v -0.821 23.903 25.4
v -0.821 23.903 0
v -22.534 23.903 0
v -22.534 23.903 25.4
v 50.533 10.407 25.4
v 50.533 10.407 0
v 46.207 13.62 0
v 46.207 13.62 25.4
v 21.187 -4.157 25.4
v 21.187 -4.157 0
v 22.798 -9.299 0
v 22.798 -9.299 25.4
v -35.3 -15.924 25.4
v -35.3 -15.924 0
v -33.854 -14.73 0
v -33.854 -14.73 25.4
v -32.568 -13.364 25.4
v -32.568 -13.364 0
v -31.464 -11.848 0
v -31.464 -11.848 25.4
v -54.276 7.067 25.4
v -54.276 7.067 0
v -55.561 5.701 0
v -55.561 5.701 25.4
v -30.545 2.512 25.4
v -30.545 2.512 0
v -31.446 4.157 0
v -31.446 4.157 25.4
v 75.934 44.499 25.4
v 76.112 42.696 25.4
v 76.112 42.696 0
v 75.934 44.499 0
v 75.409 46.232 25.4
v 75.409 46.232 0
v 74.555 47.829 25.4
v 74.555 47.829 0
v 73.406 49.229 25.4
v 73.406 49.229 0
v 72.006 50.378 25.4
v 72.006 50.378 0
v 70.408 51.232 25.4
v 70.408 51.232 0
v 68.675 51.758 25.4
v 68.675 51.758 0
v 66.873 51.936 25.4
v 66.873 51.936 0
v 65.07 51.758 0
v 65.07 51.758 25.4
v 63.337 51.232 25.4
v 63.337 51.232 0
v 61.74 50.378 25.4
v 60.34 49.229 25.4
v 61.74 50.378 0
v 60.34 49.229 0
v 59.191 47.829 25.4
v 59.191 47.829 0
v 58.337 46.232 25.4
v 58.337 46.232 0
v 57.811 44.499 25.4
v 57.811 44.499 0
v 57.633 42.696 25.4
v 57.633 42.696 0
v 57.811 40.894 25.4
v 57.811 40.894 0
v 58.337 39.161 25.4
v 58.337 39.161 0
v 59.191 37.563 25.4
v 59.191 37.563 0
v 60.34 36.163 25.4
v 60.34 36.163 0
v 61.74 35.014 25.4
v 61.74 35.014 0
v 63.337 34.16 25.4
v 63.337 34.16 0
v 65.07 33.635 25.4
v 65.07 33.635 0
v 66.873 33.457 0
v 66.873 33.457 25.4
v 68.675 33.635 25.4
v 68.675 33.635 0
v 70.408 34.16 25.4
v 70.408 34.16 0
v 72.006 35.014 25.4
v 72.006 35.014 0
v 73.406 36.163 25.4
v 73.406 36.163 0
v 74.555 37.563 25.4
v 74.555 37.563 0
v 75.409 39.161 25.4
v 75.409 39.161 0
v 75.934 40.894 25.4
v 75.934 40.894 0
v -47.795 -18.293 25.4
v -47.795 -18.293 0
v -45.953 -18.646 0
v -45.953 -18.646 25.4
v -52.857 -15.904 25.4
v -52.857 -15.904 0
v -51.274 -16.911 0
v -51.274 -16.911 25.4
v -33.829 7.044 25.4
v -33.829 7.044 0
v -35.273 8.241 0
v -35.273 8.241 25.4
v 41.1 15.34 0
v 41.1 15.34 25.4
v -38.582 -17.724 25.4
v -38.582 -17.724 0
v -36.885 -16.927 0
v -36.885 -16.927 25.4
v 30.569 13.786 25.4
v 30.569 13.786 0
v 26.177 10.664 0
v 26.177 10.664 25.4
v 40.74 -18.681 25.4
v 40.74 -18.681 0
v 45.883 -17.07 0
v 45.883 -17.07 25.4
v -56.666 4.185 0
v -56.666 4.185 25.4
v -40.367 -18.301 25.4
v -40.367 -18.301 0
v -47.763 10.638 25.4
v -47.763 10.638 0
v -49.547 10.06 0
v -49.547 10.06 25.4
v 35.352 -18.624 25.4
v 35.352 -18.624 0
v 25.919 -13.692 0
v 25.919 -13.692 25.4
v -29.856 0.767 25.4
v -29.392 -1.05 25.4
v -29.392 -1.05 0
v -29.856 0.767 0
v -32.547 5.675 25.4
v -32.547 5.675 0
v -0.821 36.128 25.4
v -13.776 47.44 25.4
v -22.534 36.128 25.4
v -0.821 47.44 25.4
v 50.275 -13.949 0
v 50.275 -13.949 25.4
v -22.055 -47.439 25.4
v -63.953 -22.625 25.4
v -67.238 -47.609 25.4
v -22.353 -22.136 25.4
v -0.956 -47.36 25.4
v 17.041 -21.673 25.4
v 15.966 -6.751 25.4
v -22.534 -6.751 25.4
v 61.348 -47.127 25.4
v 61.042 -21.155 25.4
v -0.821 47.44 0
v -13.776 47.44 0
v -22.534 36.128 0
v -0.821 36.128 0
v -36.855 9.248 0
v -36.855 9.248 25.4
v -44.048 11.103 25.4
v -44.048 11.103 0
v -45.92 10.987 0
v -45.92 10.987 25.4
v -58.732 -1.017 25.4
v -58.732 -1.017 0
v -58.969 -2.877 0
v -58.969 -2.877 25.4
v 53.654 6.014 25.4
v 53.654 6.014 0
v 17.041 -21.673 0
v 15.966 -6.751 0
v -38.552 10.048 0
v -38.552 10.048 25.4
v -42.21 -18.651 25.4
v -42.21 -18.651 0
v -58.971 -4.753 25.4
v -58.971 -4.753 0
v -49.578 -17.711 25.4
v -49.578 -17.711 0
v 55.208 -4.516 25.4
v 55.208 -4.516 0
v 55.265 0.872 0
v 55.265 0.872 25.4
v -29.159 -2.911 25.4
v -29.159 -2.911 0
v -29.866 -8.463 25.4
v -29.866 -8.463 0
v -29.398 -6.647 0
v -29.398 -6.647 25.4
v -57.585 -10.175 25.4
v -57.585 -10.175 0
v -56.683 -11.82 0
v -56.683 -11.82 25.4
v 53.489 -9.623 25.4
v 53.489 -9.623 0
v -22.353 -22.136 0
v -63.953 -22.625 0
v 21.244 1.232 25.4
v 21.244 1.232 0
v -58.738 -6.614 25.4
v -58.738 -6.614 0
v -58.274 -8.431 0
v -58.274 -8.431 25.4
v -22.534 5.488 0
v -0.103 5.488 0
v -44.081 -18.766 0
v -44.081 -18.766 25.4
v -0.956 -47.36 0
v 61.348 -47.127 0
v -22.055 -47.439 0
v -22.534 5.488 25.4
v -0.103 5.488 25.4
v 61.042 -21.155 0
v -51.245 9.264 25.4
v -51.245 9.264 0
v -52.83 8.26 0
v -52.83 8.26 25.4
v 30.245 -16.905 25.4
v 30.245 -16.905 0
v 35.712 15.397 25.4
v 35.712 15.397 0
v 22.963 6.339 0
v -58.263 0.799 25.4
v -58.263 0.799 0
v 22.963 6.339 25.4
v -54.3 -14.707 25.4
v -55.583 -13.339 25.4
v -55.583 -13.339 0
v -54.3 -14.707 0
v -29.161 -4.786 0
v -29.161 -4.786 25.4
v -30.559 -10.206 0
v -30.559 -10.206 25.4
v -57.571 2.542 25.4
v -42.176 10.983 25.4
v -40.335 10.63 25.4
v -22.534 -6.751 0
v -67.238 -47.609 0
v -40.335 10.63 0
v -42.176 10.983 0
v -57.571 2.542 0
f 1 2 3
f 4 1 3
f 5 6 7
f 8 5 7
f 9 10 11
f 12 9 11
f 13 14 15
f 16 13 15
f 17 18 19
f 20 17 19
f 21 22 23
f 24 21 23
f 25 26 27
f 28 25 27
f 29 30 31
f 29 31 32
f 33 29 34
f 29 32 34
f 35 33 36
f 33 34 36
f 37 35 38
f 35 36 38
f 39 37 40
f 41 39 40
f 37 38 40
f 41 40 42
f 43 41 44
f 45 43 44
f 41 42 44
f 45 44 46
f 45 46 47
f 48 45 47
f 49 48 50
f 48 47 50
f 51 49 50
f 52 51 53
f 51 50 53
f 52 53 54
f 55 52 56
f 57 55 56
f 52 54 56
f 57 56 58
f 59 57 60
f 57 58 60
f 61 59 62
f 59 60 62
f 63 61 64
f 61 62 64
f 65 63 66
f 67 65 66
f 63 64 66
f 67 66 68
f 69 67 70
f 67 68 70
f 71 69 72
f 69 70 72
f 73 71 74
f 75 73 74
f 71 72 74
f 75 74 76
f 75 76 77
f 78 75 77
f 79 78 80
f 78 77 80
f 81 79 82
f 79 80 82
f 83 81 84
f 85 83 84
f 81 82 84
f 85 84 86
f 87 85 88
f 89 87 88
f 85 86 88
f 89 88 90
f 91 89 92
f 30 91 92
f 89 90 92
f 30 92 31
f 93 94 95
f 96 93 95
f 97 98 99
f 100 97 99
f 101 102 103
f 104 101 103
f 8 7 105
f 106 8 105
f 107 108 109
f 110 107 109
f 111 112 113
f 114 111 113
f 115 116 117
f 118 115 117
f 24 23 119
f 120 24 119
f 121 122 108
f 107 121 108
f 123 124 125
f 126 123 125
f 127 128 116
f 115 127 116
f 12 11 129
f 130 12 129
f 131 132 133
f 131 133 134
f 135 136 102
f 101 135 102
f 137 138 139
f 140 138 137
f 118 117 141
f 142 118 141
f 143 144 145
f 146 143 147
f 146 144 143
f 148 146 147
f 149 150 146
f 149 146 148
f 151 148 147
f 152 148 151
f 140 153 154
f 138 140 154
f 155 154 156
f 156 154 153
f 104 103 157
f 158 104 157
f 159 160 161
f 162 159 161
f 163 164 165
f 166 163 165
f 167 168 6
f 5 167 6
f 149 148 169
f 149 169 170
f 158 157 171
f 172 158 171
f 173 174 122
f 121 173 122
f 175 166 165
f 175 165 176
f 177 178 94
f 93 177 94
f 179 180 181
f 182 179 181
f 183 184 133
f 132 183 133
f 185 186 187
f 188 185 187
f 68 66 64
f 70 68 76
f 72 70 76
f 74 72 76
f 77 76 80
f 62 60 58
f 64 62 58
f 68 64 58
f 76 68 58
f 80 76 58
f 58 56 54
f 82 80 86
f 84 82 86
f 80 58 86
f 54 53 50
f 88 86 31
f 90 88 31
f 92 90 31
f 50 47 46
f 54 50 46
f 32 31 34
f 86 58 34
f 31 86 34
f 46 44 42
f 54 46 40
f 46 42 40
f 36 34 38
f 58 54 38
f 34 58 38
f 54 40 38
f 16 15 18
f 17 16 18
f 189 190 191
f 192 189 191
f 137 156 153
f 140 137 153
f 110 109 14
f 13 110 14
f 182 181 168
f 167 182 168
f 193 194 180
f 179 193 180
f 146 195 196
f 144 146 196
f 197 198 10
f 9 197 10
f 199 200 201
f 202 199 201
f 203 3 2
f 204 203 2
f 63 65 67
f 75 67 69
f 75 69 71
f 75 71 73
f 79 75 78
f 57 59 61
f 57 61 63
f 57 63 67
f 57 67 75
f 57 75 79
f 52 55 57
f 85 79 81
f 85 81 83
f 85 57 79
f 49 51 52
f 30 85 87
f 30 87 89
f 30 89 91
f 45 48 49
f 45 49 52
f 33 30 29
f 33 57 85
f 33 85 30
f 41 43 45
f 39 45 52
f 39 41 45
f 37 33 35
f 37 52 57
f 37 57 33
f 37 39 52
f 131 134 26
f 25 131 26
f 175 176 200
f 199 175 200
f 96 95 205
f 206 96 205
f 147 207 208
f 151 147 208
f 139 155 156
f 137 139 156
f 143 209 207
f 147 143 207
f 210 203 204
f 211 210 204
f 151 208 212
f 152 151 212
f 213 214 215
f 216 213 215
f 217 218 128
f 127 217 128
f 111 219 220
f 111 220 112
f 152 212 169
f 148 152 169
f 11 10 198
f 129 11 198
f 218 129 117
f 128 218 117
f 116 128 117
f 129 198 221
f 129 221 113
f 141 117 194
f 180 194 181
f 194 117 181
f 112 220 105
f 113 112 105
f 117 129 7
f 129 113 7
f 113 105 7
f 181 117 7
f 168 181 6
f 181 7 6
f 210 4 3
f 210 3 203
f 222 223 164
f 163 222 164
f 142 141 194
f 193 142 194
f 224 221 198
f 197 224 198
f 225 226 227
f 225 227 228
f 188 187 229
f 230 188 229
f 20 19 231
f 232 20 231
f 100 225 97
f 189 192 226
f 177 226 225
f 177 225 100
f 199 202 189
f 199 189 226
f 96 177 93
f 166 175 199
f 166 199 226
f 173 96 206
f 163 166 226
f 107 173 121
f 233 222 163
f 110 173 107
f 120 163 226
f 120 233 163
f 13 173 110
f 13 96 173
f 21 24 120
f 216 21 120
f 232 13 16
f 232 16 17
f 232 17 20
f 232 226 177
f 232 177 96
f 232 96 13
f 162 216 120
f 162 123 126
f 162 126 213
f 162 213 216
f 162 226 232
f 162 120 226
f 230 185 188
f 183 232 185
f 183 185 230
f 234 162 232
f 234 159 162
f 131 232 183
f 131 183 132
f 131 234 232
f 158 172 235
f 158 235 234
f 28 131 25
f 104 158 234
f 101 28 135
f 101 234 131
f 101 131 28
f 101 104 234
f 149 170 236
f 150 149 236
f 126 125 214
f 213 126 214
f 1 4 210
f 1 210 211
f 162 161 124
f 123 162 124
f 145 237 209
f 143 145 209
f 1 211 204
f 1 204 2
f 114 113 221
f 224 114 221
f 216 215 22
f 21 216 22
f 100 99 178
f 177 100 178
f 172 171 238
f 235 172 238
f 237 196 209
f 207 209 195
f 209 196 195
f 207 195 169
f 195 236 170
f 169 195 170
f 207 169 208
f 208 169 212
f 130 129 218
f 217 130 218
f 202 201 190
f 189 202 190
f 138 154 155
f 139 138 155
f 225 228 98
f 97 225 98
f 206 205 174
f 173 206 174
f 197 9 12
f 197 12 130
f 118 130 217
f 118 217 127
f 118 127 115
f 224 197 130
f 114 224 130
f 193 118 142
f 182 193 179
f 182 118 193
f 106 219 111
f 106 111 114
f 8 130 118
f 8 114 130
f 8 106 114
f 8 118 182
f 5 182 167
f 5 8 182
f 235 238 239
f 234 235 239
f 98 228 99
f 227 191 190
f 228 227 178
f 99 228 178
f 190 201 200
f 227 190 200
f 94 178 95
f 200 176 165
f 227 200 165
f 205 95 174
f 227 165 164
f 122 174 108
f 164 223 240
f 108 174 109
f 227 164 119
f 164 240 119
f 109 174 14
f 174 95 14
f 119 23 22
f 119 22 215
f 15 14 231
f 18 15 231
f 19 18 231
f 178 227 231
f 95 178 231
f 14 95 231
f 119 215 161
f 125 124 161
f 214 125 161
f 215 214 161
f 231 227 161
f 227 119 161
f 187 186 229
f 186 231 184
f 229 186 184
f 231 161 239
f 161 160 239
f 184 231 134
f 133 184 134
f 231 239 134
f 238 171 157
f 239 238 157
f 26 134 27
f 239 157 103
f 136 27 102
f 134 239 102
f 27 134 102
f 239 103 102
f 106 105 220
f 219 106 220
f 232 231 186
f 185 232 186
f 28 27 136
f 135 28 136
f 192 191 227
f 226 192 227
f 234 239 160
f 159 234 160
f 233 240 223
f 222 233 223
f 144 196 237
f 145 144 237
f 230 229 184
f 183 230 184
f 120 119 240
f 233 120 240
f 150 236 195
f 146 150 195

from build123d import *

# Parameters (mm, degrees)
F1_DEPTH = 25.4
F3_R     = 9.2391890303
F4_DEPTH = 25.4
F6_DEPTH = 25.4


with BuildPart() as f1:
    # F0 (on Top) → F1 (new body)
    with BuildSketch(Plane.XY):
        Polygon((-35.2999434542, -15.9238262774), (-33.8535144259, -14.7299484609), (-32.5681234897, -13.3641991003), (-31.4640420286, -11.848116879), (-30.5586820668, -10.2056113191), (-29.8663216716, -8.4625857147), (-29.3978797801, -6.6465286206), (-29.1607440008, -4.7860803421), (-29.1586541066, -2.91058126), (-29.3916430563, -1.0496091151), (-29.8560364751, 0.7674874501), (-30.5445106012, 2.5120517373), (-31.4462077865, 4.1565709256), (-32.5469077277, 5.675109965), (-33.8292517292, 7.0437205876), (-35.2730164601, 8.2408189865), (-36.855432888, 9.2475262047), (-38.5515453607, 10.0479658681), (-40.3346051712, 10.6295145649), (-42.1764924012, 10.9830009248), (-44.0481593888, 11.1028502569), (-45.9200888274, 10.9871724654), (-47.7627592716, 10.6377918584), (-49.5471107078, 10.0602183766), (-51.2450028479, 9.2635606989), (-52.8296589185, 8.2603825928), (-54.2760879468, 7.0665047763), (-55.5614788829, 5.7007554158), (-56.665560344, 4.1846731944), (-57.5709203059, 2.5421676345), (-58.2632807011, 0.7991420301), (-58.7317225925, -1.016915064), (-58.9688583718, -2.8773633425), (-58.9709482661, -4.7528624246), (-58.7379593163, -6.6138345695), (-58.2735658976, -8.4309311347), (-57.5850917714, -10.1754954219), (-56.6833945861, -11.8200146102), (-55.5826946449, -13.3385536495), (-54.3003506434, -14.7071642722), (-52.8565859126, -15.9042626711), (-51.2741694846, -16.9109698893), (-49.5780570119, -17.7114095526), (-47.7949972014, -18.2929582495), (-45.9531099714, -18.6464446094), (-44.0814429839, -18.7662939415), (-42.2095135452, -18.65061615), (-40.366843101, -18.301235543), (-38.5824916648, -17.7236620612), (-36.8845995248, -16.9270043835), align=None)
    extrude(amount=F1_DEPTH)


with BuildPart() as f1b:
    # F0 (on Top) → F1, piece 2 (new body)
    with BuildSketch(Plane.XY):
        Polygon((45.8826378737, -17.0699117925), (50.2753301706, -13.9487886581), (53.4885487135, -9.6230075922), (55.2077612837, -4.516006185), (55.2646793763, 0.8723066832), (53.653731452, 6.0144854062), (50.5326083176, 10.407177703), (46.2068272516, 13.6203962459), (41.0998258444, 15.3396088161), (35.7115129763, 15.3965269088), (30.5693342532, 13.7855789844), (26.1766419564, 10.66445585), (22.9634234135, 6.3386747841), (21.2442108433, 1.2316733769), (21.1872927506, -4.1566394913), (22.798240675, -9.2988182143), (25.9193638094, -13.6915105111), (30.2451448753, -16.904729054), (35.3521462825, -18.6239416242), (40.7404591507, -18.6808597169), align=None)
    extrude(amount=F1_DEPTH)


with BuildPart() as f4:
    # F3 (on Top) → F4 (new body)
    with BuildSketch(Plane.XY):
        with Locations((66.8726712465, 42.6963306963)):
            Circle(F3_R)
    extrude(amount=F4_DEPTH)


with BuildPart() as f4b:
    # F2 (on Top) → F4, piece 2 (new body)
    with BuildSketch(Plane.XY):
        Polygon((-13.7759521604, 47.4403649569), (-22.534172982, 36.1276641488), (-0.8210833184, 36.1276641488), (-0.8210833184, 47.4403649569), align=None)
    extrude(amount=F4_DEPTH)


with BuildPart() as f4c:
    # F2 (on Top) → F4, piece 3 (new body)
    with BuildSketch(Plane.XY):
        Polygon((-0.8210833184, 23.9026453346), (-22.534172982, 23.9026453346), (-22.534172982, 5.4876731566), (-0.1027688056, 5.4876731566), align=None)
    extrude(amount=F4_DEPTH)


with BuildPart() as f6:
    # F5 (on Top) → F6 (new body)
    with BuildSketch(Plane.XY):
        Polygon((-22.0554731194, -47.4393907258), (-22.3531693042, -22.1359777789), (-63.9532580972, -22.6254053414), (-67.2375932336, -47.608587577), align=None)
        Polygon((17.0406657768, -21.6725069248), (-22.3531693042, -22.1359777789), (-22.0554731194, -47.4393907258), (-0.9564412048, -47.3603796091), (18.874789772, -47.1270639764), align=None)
        Polygon((15.9655082971, -6.751128938), (-22.534172982, -6.751128938), (-22.3531693042, -22.1359777789), (17.0406657768, -21.6725069248), align=None)
        Polygon((61.0423149158, -21.1548248595), (17.0406657768, -21.6725069248), (18.874789772, -47.1270639764), (-0.9564412048, -47.3603796091), (61.347879881, -47.1270639764), align=None)
    extrude(amount=F6_DEPTH)


solid = Compound([f1.part, f1b.part, f4.part, f4b.part, f4c.part, f6.part])
